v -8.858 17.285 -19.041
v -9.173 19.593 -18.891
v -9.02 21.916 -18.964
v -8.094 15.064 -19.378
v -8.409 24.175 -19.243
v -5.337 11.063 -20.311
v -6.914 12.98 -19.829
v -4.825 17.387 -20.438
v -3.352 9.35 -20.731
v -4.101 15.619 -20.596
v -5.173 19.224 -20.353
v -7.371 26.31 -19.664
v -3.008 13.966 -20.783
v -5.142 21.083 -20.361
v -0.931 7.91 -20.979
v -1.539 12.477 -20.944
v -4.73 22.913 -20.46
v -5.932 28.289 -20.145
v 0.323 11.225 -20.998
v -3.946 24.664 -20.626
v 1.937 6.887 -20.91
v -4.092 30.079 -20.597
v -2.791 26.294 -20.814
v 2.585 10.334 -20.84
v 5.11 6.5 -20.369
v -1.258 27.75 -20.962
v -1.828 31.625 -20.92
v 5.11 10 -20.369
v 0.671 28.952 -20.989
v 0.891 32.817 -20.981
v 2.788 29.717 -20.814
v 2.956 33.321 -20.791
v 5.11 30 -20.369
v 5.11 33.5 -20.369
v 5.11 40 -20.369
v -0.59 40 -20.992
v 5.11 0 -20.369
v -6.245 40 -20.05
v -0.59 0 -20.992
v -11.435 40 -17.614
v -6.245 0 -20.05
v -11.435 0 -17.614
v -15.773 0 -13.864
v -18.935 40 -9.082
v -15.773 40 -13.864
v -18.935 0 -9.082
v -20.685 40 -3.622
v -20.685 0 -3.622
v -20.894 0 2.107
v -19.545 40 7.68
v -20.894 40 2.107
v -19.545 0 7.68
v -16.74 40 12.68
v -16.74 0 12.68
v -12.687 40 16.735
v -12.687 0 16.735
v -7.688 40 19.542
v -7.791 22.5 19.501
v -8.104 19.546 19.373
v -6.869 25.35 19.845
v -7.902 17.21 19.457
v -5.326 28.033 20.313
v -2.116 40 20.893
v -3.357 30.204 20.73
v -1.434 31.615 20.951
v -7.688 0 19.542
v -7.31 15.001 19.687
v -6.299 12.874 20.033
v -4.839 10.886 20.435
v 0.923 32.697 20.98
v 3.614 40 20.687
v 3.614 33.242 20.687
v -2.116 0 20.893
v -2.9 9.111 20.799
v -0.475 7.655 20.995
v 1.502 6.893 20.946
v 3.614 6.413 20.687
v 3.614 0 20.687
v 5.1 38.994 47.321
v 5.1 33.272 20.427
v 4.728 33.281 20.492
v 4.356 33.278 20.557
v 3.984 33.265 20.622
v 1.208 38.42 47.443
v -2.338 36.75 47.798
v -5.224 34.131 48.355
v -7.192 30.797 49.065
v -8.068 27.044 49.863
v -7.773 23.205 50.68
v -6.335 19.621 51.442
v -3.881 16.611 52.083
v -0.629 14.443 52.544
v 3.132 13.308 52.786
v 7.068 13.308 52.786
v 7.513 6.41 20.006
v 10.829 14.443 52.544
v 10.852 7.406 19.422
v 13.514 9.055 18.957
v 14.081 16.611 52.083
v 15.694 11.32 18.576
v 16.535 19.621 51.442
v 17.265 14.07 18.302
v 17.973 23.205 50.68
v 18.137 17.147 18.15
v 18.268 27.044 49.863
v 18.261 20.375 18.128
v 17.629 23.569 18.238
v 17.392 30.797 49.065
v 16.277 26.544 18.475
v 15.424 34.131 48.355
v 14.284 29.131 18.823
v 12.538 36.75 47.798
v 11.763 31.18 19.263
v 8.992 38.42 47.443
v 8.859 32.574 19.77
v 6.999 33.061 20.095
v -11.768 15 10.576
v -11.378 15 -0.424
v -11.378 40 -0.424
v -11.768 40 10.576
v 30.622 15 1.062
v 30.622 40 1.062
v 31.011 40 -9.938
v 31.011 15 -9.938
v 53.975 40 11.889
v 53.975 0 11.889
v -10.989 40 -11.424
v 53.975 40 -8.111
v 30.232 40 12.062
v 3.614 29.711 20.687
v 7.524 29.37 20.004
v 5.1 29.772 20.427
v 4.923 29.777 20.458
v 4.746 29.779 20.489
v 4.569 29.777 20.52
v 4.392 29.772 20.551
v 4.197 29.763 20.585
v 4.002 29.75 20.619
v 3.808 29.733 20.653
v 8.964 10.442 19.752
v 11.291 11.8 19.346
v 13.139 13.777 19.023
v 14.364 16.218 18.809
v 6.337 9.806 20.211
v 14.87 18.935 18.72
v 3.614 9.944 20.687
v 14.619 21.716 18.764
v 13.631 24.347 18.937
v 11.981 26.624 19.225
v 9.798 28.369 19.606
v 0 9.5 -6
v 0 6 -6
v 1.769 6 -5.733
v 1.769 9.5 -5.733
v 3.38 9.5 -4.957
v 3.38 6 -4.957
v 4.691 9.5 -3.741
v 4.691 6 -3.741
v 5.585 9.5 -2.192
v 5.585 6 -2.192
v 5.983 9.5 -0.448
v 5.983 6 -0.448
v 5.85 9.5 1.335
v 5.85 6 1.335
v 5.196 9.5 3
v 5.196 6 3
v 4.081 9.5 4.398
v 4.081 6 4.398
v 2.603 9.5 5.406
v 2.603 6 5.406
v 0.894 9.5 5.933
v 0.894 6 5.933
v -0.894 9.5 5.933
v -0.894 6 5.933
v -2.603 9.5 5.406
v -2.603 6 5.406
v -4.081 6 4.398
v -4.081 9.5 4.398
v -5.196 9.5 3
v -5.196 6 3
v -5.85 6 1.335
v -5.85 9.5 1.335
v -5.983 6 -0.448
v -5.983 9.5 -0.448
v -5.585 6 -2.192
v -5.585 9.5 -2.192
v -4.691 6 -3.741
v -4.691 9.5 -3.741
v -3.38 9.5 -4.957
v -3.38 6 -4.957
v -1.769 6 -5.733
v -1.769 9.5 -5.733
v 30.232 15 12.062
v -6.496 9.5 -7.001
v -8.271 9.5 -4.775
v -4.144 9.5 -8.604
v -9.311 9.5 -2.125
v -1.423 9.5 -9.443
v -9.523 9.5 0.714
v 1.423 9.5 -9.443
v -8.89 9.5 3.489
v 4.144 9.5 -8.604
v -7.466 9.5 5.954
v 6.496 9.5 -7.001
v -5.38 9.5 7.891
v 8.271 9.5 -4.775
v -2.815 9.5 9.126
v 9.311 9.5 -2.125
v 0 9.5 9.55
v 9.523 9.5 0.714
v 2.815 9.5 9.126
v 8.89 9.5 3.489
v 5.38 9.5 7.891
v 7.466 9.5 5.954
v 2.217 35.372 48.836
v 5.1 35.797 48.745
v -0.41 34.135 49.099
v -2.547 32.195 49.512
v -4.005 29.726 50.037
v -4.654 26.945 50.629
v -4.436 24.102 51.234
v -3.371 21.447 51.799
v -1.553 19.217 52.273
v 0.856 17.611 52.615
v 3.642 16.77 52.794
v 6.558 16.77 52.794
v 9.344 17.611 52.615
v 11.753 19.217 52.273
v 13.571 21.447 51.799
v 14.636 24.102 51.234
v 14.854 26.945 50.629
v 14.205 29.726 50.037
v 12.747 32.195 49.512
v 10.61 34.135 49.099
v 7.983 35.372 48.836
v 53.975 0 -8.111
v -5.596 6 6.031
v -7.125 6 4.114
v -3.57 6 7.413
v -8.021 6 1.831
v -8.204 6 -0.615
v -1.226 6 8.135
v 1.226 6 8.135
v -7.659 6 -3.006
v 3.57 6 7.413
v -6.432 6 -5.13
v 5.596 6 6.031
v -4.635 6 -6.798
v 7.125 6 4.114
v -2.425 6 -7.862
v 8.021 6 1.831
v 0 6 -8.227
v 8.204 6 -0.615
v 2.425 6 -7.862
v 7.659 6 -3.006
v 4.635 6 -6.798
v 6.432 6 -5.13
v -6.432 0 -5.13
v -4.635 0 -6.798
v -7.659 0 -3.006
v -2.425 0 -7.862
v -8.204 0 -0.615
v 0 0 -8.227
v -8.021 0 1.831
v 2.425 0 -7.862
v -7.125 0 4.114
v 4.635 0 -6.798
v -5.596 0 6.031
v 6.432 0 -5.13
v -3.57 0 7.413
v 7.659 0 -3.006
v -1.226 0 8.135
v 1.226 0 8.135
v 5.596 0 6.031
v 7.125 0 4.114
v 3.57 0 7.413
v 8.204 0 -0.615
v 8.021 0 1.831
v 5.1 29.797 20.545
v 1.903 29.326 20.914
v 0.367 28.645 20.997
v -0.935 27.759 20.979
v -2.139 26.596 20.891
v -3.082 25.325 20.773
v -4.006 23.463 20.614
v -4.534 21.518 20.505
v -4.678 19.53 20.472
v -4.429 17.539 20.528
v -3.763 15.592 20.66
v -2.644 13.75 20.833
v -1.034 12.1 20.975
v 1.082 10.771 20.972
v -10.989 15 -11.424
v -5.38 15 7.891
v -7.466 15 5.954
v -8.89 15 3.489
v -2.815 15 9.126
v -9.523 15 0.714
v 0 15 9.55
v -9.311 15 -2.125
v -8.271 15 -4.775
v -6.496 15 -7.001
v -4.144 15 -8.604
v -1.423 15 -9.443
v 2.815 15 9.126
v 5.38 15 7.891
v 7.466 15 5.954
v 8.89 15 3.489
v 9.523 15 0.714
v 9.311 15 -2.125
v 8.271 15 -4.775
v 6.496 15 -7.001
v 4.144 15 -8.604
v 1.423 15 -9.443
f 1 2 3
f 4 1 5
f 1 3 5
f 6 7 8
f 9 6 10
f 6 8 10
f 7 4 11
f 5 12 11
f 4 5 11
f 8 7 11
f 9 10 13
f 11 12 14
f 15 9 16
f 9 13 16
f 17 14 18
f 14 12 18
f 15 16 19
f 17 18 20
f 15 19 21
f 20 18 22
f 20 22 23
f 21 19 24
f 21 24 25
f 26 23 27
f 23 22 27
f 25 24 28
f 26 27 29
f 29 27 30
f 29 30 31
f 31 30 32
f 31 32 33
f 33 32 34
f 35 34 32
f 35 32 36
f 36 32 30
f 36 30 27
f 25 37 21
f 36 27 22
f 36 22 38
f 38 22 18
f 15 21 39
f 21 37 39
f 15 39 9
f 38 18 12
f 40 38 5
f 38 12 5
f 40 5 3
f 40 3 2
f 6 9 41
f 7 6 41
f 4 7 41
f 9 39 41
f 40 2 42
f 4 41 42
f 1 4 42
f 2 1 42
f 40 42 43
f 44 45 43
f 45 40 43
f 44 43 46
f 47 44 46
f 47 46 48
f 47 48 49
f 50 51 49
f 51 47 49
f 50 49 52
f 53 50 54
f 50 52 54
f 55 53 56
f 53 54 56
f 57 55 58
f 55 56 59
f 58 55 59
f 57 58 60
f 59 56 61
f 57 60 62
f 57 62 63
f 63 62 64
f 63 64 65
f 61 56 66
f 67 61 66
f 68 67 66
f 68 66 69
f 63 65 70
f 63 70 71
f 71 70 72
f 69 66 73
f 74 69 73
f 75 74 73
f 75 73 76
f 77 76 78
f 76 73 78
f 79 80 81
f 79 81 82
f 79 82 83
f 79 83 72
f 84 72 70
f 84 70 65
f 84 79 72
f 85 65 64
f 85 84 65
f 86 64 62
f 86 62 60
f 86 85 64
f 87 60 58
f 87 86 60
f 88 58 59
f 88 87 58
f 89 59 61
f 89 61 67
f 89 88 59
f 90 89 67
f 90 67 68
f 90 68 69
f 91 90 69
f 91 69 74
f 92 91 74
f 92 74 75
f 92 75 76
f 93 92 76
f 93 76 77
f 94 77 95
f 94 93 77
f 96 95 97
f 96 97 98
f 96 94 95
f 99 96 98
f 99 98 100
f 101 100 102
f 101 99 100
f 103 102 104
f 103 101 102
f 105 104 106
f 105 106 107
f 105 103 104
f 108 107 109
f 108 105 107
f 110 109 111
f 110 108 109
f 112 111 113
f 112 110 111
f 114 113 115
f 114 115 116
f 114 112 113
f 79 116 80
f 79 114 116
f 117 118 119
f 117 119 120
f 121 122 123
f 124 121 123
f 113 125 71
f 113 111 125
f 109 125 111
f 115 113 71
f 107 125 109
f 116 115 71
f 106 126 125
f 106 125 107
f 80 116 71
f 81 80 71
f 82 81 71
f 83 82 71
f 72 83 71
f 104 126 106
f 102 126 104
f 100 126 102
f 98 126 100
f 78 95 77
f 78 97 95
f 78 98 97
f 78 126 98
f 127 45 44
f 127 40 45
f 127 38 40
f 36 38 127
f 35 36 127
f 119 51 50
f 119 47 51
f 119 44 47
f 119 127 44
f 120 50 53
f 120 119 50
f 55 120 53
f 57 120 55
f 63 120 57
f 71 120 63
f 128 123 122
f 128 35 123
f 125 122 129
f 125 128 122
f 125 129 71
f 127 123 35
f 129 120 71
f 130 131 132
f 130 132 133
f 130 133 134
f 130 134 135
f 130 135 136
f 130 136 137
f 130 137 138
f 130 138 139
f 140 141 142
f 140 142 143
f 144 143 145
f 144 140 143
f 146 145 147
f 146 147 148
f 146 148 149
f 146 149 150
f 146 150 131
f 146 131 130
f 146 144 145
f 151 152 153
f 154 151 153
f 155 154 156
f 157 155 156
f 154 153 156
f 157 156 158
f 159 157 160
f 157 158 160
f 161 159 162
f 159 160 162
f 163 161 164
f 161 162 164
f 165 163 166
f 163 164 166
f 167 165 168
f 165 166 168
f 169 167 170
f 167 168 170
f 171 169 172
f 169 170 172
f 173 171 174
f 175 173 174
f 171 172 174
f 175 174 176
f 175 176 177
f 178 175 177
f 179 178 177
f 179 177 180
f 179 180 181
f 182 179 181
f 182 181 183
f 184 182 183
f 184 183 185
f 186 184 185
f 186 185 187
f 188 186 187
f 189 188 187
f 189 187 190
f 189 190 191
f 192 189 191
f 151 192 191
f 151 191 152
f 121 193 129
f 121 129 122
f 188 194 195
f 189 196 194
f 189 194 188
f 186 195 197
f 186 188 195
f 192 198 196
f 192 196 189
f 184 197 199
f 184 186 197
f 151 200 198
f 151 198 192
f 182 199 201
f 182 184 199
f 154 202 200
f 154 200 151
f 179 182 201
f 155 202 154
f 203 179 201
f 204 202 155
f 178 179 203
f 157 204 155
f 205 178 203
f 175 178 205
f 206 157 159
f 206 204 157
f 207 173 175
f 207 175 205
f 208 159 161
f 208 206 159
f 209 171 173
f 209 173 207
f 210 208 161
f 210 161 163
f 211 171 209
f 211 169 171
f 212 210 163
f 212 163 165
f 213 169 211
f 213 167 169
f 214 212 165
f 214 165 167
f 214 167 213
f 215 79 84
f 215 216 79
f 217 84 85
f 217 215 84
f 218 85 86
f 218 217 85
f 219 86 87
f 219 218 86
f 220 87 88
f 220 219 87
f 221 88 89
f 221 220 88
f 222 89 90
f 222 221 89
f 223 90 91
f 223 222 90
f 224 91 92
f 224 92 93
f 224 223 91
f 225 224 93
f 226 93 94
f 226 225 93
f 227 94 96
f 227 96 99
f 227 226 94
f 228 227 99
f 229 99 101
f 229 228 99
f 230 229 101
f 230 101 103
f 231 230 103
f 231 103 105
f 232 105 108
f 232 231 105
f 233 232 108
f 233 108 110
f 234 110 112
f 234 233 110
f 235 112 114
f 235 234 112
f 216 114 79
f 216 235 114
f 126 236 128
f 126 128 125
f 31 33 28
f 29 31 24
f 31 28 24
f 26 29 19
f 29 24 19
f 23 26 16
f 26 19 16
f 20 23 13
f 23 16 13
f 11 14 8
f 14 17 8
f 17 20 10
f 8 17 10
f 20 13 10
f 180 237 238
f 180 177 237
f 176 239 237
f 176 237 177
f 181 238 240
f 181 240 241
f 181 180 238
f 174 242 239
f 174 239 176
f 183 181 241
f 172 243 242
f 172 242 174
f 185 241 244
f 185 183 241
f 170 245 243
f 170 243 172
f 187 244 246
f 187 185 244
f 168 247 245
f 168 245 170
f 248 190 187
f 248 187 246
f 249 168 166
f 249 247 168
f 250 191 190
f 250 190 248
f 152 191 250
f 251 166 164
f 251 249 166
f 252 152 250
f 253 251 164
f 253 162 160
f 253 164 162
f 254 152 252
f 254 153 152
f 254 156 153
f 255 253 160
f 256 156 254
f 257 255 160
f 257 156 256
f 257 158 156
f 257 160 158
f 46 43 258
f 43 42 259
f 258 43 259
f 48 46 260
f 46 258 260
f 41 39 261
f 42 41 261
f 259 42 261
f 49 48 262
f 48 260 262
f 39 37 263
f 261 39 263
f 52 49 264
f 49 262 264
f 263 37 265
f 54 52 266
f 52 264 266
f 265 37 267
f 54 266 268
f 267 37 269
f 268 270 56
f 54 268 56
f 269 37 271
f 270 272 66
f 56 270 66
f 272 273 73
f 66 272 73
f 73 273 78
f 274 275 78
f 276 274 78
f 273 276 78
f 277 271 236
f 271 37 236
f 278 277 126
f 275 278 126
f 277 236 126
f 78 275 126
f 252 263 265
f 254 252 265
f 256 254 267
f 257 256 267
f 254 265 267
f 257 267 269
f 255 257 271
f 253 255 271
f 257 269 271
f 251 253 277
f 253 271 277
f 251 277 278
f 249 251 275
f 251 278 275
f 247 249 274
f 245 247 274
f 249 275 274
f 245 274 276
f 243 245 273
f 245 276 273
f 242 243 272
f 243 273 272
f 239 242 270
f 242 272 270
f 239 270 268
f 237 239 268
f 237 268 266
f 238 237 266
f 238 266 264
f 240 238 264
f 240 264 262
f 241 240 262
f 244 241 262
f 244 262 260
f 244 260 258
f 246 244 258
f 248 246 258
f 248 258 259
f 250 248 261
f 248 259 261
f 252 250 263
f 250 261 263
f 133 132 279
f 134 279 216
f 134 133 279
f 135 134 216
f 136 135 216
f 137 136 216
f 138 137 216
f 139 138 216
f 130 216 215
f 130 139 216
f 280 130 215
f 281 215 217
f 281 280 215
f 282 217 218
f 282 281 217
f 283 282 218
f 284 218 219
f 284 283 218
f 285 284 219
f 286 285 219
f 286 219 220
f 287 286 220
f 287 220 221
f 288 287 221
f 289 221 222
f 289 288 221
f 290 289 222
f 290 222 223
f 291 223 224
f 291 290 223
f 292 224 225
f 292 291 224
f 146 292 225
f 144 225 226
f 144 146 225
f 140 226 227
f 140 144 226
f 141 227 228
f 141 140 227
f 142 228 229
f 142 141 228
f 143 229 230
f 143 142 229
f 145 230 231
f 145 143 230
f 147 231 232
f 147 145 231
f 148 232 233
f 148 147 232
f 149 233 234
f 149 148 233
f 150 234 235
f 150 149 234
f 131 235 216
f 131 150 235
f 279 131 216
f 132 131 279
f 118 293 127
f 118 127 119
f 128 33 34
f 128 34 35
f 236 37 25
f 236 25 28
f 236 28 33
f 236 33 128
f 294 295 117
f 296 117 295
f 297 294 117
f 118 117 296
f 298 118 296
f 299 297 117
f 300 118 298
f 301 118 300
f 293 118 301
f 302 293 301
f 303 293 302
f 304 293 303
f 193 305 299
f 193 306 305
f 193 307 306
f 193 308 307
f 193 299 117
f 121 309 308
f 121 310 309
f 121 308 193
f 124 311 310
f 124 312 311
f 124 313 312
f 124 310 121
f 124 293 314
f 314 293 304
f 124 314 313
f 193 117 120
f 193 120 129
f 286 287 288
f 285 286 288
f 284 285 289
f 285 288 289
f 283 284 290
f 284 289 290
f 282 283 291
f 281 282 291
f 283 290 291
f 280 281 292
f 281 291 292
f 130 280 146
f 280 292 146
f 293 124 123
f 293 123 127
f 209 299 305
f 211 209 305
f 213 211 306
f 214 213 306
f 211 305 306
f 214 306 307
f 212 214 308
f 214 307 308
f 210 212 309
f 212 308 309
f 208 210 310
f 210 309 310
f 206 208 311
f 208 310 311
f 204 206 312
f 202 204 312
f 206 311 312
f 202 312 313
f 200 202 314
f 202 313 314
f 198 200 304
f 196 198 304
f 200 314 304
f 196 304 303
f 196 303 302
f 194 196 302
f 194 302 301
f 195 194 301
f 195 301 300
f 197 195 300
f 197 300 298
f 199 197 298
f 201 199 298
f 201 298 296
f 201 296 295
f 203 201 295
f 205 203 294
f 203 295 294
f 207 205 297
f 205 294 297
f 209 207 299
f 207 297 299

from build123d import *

# Parameters (mm, degrees)
CROQUIS1_R              = 21
SALIENTE_EXTRUIR1_DEPTH = 40
SALIENTE_EXTRUIR2_DEPTH = 40
SALIENTE_EXTRUIR3_REACH = 77.493
CROQUIS3_R              = 13.5
CROQUIS3_R_2            = 10
CROQUIS7_R              = 8.227269221
CROQUIS7_R_2            = 6
CORTAR_EXTRUIR6_DEPTH   = 6
CROQUIS8_R              = 6
CORTAR_EXTRUIR7_DEPTH   = 72.223648425
CORTAR_EXTRUIR8_START   = -25
CORTAR_EXTRUIR8_DEPTH   = 25
CROQUIS12_R             = 9.55
CORTAR_EXTRUIR9_DEPTH   = 5.5
CORTAR_EXTRUIR10_DEPTH  = 86.45696425


with BuildPart() as part:
    # Croquis1 → Saliente-Extruir1 (new body)
    with BuildSketch(Plane(origin=(0, 0, 0), x_dir=(1, 0, 0), z_dir=(0, 1, 0))):
        with Locations(Location((0, 0, 0), (0, 0, 270))):
            Circle(CROQUIS1_R)
    extrude(amount=SALIENTE_EXTRUIR1_DEPTH)

    # Croquis2 → Saliente-Extruir2 (add)
    with BuildSketch(Plane(origin=(0, 0, 0), x_dir=(1, 0, 0), z_dir=(0, 1, 0))):
        with BuildLine():
            Line((53.975127576, 8.110971331), (53.975127576, -11.889028669))
            Line((53.975127576, -11.889028669), (3.613793412, -20.686722727))
            ThreePointArc((3.613793412, -20.686722727), (20.98607707, -0.764571273), (5.109545014, 20.368911354))
            Line((5.109545014, 20.368911354), (53.975127576, 8.110971331))
        make_face()
    extrude(amount=SALIENTE_EXTRUIR2_DEPTH)

    # Croquis3 → Saliente-Extruir3 (add, up to next)
    with BuildSketch(Plane(origin=(5.109545014, 0, -20.368911354), x_dir=(-0.9699481597219111, 0, -0.24331166731597212), z_dir=(0.2433116673159721, 0, -0.969948159721911)), mode=Mode.PRIVATE) as saliente_extruir3_sk1:
        with Locations((0, 20)):
            Circle(CROQUIS3_R)
        with Locations((0, 20)):
            Circle(CROQUIS3_R_2, mode=Mode.SUBTRACT)
    saliente_extruir3_tool1 = extrude(saliente_extruir3_sk1.sketch, amount=-SALIENTE_EXTRUIR3_REACH, mode=Mode.PRIVATE) - part.part
    add(saliente_extruir3_tool1.solids().sort_by_distance((17.833482, 20, -17.177109))[0])

    # Croquis7 → Cortar-Extruir6 (cut)
    with BuildSketch(Plane.XZ):
        with Locations(Location((0, 0, 0), (0, 0, 270))):
            Circle(CROQUIS7_R)
        with Locations(Location((0, 0, 0), (0, 0, 270))):
            Circle(CROQUIS7_R_2, mode=Mode.SUBTRACT)
    extrude(amount=-CORTAR_EXTRUIR6_DEPTH, mode=Mode.SUBTRACT)

    # Croquis8 → Cortar-Extruir7 (cut, through all)
    with BuildSketch(Plane.XZ):
        with Locations(Location((0, 0, 0), (0, 0, 270))):
            Circle(CROQUIS8_R)
    extrude(amount=-CORTAR_EXTRUIR7_DEPTH, mode=Mode.SUBTRACT)

    # Croquis10 → Cortar-Extruir8 (cut)
    with BuildSketch(Plane(origin=(0, 40, 0), x_dir=(1, 0, 0), z_dir=(0, 1, 0)).offset(CORTAR_EXTRUIR8_START)):
        with BuildLine():
            Line((-5.995438853, 0.23390802), (-11.37823559, 0.424457107))
            Line((-11.37823559, 0.424457107), (-11.767631672, -10.575542893))
            Line((-11.767631672, -10.575542893), (30.232368328, -12.062327932))
            Line((30.232368328, -12.062327932), (30.62176441, -1.062327932))
            Line((30.62176441, -1.062327932), (5.996971268, -0.190619027))
            ThreePointArc((5.996971268, -0.190619027), (-0.212264906, -5.996244125), (-5.995438853, 0.23390802))
        make_face()
        with BuildLine():
            Line((-10.988839509, 11.424457107), (-11.37823559, 0.424457107))
            Line((-11.37823559, 0.424457107), (-5.995438853, 0.23390802))
            ThreePointArc((-5.995438853, 0.23390802), (0.116976243, 5.998859605), (6, 0))
            ThreePointArc((6, 0), (5.999242769, -0.095321543), (5.996971268, -0.190619027))
            Line((5.996971268, -0.190619027), (30.62176441, -1.062327932))
            Line((30.62176441, -1.062327932), (31.011160491, 9.937672068))
            Line((31.011160491, 9.937672068), (-10.988839509, 11.424457107))
        make_face()
    extrude(amount=CORTAR_EXTRUIR8_DEPTH, mode=Mode.SUBTRACT)

    # Croquis12 → Cortar-Extruir9 (cut)
    with BuildSketch(Plane(origin=(0, 15, 0), x_dir=(1, 0, 0), z_dir=(0, 1, 0))):
        with Locations(Location((0, 0, 0), (0, 0, 270))):
            Circle(CROQUIS12_R)
    extrude(amount=-CORTAR_EXTRUIR9_DEPTH, mode=Mode.SUBTRACT)

    # Croquis4 → Revolución3 (revolve)
    with BuildSketch(Plane(origin=(5.1, 0, 0), x_dir=(0, 0, -1), z_dir=(1, 0, 0)), mode=Mode.PRIVATE) as revoluci_n3_sk:
        Polygon((-24.61645883, 10.663524112), (-17.776790486, 9.208275528), (-17.776790486, 5.708275528), (-52.81645883, 13.163524112), (-52.81645883, 16.663524112), align=None)
    revolve(revoluci_n3_sk.sketch.rotate(Axis((5.1, 20.663524112, 24.61645883), (0, 0.20810764446485971, 0.9781059289848353)), 180), axis=Axis((5.1, 20.663524112, 24.61645883), (0, 0.20810764446485971, 0.9781059289848353)))

    # Croquis17 → Cortar-Extruir10 (cut, through all)
    with BuildSketch(Plane(origin=(0, 40, 0), x_dir=(1, 0, 0), z_dir=(0, 1, 0))):
        with BuildLine():
            Line((5.109545014, 20.368911354), (5.109545014, 31.680559043))
            Line((5.109545014, 31.680559043), (-13.688349404, 31.680559043))
            Line((-13.688349404, 31.680559043), (-13.688349404, 15.925736736))
            ThreePointArc((-13.688349404, 15.925736736), (-4.830571536, 20.436868122), (5.109545014, 20.368911354))
        make_face()
    extrude(amount=-CORTAR_EXTRUIR10_DEPTH, mode=Mode.SUBTRACT)


solid = part.part
